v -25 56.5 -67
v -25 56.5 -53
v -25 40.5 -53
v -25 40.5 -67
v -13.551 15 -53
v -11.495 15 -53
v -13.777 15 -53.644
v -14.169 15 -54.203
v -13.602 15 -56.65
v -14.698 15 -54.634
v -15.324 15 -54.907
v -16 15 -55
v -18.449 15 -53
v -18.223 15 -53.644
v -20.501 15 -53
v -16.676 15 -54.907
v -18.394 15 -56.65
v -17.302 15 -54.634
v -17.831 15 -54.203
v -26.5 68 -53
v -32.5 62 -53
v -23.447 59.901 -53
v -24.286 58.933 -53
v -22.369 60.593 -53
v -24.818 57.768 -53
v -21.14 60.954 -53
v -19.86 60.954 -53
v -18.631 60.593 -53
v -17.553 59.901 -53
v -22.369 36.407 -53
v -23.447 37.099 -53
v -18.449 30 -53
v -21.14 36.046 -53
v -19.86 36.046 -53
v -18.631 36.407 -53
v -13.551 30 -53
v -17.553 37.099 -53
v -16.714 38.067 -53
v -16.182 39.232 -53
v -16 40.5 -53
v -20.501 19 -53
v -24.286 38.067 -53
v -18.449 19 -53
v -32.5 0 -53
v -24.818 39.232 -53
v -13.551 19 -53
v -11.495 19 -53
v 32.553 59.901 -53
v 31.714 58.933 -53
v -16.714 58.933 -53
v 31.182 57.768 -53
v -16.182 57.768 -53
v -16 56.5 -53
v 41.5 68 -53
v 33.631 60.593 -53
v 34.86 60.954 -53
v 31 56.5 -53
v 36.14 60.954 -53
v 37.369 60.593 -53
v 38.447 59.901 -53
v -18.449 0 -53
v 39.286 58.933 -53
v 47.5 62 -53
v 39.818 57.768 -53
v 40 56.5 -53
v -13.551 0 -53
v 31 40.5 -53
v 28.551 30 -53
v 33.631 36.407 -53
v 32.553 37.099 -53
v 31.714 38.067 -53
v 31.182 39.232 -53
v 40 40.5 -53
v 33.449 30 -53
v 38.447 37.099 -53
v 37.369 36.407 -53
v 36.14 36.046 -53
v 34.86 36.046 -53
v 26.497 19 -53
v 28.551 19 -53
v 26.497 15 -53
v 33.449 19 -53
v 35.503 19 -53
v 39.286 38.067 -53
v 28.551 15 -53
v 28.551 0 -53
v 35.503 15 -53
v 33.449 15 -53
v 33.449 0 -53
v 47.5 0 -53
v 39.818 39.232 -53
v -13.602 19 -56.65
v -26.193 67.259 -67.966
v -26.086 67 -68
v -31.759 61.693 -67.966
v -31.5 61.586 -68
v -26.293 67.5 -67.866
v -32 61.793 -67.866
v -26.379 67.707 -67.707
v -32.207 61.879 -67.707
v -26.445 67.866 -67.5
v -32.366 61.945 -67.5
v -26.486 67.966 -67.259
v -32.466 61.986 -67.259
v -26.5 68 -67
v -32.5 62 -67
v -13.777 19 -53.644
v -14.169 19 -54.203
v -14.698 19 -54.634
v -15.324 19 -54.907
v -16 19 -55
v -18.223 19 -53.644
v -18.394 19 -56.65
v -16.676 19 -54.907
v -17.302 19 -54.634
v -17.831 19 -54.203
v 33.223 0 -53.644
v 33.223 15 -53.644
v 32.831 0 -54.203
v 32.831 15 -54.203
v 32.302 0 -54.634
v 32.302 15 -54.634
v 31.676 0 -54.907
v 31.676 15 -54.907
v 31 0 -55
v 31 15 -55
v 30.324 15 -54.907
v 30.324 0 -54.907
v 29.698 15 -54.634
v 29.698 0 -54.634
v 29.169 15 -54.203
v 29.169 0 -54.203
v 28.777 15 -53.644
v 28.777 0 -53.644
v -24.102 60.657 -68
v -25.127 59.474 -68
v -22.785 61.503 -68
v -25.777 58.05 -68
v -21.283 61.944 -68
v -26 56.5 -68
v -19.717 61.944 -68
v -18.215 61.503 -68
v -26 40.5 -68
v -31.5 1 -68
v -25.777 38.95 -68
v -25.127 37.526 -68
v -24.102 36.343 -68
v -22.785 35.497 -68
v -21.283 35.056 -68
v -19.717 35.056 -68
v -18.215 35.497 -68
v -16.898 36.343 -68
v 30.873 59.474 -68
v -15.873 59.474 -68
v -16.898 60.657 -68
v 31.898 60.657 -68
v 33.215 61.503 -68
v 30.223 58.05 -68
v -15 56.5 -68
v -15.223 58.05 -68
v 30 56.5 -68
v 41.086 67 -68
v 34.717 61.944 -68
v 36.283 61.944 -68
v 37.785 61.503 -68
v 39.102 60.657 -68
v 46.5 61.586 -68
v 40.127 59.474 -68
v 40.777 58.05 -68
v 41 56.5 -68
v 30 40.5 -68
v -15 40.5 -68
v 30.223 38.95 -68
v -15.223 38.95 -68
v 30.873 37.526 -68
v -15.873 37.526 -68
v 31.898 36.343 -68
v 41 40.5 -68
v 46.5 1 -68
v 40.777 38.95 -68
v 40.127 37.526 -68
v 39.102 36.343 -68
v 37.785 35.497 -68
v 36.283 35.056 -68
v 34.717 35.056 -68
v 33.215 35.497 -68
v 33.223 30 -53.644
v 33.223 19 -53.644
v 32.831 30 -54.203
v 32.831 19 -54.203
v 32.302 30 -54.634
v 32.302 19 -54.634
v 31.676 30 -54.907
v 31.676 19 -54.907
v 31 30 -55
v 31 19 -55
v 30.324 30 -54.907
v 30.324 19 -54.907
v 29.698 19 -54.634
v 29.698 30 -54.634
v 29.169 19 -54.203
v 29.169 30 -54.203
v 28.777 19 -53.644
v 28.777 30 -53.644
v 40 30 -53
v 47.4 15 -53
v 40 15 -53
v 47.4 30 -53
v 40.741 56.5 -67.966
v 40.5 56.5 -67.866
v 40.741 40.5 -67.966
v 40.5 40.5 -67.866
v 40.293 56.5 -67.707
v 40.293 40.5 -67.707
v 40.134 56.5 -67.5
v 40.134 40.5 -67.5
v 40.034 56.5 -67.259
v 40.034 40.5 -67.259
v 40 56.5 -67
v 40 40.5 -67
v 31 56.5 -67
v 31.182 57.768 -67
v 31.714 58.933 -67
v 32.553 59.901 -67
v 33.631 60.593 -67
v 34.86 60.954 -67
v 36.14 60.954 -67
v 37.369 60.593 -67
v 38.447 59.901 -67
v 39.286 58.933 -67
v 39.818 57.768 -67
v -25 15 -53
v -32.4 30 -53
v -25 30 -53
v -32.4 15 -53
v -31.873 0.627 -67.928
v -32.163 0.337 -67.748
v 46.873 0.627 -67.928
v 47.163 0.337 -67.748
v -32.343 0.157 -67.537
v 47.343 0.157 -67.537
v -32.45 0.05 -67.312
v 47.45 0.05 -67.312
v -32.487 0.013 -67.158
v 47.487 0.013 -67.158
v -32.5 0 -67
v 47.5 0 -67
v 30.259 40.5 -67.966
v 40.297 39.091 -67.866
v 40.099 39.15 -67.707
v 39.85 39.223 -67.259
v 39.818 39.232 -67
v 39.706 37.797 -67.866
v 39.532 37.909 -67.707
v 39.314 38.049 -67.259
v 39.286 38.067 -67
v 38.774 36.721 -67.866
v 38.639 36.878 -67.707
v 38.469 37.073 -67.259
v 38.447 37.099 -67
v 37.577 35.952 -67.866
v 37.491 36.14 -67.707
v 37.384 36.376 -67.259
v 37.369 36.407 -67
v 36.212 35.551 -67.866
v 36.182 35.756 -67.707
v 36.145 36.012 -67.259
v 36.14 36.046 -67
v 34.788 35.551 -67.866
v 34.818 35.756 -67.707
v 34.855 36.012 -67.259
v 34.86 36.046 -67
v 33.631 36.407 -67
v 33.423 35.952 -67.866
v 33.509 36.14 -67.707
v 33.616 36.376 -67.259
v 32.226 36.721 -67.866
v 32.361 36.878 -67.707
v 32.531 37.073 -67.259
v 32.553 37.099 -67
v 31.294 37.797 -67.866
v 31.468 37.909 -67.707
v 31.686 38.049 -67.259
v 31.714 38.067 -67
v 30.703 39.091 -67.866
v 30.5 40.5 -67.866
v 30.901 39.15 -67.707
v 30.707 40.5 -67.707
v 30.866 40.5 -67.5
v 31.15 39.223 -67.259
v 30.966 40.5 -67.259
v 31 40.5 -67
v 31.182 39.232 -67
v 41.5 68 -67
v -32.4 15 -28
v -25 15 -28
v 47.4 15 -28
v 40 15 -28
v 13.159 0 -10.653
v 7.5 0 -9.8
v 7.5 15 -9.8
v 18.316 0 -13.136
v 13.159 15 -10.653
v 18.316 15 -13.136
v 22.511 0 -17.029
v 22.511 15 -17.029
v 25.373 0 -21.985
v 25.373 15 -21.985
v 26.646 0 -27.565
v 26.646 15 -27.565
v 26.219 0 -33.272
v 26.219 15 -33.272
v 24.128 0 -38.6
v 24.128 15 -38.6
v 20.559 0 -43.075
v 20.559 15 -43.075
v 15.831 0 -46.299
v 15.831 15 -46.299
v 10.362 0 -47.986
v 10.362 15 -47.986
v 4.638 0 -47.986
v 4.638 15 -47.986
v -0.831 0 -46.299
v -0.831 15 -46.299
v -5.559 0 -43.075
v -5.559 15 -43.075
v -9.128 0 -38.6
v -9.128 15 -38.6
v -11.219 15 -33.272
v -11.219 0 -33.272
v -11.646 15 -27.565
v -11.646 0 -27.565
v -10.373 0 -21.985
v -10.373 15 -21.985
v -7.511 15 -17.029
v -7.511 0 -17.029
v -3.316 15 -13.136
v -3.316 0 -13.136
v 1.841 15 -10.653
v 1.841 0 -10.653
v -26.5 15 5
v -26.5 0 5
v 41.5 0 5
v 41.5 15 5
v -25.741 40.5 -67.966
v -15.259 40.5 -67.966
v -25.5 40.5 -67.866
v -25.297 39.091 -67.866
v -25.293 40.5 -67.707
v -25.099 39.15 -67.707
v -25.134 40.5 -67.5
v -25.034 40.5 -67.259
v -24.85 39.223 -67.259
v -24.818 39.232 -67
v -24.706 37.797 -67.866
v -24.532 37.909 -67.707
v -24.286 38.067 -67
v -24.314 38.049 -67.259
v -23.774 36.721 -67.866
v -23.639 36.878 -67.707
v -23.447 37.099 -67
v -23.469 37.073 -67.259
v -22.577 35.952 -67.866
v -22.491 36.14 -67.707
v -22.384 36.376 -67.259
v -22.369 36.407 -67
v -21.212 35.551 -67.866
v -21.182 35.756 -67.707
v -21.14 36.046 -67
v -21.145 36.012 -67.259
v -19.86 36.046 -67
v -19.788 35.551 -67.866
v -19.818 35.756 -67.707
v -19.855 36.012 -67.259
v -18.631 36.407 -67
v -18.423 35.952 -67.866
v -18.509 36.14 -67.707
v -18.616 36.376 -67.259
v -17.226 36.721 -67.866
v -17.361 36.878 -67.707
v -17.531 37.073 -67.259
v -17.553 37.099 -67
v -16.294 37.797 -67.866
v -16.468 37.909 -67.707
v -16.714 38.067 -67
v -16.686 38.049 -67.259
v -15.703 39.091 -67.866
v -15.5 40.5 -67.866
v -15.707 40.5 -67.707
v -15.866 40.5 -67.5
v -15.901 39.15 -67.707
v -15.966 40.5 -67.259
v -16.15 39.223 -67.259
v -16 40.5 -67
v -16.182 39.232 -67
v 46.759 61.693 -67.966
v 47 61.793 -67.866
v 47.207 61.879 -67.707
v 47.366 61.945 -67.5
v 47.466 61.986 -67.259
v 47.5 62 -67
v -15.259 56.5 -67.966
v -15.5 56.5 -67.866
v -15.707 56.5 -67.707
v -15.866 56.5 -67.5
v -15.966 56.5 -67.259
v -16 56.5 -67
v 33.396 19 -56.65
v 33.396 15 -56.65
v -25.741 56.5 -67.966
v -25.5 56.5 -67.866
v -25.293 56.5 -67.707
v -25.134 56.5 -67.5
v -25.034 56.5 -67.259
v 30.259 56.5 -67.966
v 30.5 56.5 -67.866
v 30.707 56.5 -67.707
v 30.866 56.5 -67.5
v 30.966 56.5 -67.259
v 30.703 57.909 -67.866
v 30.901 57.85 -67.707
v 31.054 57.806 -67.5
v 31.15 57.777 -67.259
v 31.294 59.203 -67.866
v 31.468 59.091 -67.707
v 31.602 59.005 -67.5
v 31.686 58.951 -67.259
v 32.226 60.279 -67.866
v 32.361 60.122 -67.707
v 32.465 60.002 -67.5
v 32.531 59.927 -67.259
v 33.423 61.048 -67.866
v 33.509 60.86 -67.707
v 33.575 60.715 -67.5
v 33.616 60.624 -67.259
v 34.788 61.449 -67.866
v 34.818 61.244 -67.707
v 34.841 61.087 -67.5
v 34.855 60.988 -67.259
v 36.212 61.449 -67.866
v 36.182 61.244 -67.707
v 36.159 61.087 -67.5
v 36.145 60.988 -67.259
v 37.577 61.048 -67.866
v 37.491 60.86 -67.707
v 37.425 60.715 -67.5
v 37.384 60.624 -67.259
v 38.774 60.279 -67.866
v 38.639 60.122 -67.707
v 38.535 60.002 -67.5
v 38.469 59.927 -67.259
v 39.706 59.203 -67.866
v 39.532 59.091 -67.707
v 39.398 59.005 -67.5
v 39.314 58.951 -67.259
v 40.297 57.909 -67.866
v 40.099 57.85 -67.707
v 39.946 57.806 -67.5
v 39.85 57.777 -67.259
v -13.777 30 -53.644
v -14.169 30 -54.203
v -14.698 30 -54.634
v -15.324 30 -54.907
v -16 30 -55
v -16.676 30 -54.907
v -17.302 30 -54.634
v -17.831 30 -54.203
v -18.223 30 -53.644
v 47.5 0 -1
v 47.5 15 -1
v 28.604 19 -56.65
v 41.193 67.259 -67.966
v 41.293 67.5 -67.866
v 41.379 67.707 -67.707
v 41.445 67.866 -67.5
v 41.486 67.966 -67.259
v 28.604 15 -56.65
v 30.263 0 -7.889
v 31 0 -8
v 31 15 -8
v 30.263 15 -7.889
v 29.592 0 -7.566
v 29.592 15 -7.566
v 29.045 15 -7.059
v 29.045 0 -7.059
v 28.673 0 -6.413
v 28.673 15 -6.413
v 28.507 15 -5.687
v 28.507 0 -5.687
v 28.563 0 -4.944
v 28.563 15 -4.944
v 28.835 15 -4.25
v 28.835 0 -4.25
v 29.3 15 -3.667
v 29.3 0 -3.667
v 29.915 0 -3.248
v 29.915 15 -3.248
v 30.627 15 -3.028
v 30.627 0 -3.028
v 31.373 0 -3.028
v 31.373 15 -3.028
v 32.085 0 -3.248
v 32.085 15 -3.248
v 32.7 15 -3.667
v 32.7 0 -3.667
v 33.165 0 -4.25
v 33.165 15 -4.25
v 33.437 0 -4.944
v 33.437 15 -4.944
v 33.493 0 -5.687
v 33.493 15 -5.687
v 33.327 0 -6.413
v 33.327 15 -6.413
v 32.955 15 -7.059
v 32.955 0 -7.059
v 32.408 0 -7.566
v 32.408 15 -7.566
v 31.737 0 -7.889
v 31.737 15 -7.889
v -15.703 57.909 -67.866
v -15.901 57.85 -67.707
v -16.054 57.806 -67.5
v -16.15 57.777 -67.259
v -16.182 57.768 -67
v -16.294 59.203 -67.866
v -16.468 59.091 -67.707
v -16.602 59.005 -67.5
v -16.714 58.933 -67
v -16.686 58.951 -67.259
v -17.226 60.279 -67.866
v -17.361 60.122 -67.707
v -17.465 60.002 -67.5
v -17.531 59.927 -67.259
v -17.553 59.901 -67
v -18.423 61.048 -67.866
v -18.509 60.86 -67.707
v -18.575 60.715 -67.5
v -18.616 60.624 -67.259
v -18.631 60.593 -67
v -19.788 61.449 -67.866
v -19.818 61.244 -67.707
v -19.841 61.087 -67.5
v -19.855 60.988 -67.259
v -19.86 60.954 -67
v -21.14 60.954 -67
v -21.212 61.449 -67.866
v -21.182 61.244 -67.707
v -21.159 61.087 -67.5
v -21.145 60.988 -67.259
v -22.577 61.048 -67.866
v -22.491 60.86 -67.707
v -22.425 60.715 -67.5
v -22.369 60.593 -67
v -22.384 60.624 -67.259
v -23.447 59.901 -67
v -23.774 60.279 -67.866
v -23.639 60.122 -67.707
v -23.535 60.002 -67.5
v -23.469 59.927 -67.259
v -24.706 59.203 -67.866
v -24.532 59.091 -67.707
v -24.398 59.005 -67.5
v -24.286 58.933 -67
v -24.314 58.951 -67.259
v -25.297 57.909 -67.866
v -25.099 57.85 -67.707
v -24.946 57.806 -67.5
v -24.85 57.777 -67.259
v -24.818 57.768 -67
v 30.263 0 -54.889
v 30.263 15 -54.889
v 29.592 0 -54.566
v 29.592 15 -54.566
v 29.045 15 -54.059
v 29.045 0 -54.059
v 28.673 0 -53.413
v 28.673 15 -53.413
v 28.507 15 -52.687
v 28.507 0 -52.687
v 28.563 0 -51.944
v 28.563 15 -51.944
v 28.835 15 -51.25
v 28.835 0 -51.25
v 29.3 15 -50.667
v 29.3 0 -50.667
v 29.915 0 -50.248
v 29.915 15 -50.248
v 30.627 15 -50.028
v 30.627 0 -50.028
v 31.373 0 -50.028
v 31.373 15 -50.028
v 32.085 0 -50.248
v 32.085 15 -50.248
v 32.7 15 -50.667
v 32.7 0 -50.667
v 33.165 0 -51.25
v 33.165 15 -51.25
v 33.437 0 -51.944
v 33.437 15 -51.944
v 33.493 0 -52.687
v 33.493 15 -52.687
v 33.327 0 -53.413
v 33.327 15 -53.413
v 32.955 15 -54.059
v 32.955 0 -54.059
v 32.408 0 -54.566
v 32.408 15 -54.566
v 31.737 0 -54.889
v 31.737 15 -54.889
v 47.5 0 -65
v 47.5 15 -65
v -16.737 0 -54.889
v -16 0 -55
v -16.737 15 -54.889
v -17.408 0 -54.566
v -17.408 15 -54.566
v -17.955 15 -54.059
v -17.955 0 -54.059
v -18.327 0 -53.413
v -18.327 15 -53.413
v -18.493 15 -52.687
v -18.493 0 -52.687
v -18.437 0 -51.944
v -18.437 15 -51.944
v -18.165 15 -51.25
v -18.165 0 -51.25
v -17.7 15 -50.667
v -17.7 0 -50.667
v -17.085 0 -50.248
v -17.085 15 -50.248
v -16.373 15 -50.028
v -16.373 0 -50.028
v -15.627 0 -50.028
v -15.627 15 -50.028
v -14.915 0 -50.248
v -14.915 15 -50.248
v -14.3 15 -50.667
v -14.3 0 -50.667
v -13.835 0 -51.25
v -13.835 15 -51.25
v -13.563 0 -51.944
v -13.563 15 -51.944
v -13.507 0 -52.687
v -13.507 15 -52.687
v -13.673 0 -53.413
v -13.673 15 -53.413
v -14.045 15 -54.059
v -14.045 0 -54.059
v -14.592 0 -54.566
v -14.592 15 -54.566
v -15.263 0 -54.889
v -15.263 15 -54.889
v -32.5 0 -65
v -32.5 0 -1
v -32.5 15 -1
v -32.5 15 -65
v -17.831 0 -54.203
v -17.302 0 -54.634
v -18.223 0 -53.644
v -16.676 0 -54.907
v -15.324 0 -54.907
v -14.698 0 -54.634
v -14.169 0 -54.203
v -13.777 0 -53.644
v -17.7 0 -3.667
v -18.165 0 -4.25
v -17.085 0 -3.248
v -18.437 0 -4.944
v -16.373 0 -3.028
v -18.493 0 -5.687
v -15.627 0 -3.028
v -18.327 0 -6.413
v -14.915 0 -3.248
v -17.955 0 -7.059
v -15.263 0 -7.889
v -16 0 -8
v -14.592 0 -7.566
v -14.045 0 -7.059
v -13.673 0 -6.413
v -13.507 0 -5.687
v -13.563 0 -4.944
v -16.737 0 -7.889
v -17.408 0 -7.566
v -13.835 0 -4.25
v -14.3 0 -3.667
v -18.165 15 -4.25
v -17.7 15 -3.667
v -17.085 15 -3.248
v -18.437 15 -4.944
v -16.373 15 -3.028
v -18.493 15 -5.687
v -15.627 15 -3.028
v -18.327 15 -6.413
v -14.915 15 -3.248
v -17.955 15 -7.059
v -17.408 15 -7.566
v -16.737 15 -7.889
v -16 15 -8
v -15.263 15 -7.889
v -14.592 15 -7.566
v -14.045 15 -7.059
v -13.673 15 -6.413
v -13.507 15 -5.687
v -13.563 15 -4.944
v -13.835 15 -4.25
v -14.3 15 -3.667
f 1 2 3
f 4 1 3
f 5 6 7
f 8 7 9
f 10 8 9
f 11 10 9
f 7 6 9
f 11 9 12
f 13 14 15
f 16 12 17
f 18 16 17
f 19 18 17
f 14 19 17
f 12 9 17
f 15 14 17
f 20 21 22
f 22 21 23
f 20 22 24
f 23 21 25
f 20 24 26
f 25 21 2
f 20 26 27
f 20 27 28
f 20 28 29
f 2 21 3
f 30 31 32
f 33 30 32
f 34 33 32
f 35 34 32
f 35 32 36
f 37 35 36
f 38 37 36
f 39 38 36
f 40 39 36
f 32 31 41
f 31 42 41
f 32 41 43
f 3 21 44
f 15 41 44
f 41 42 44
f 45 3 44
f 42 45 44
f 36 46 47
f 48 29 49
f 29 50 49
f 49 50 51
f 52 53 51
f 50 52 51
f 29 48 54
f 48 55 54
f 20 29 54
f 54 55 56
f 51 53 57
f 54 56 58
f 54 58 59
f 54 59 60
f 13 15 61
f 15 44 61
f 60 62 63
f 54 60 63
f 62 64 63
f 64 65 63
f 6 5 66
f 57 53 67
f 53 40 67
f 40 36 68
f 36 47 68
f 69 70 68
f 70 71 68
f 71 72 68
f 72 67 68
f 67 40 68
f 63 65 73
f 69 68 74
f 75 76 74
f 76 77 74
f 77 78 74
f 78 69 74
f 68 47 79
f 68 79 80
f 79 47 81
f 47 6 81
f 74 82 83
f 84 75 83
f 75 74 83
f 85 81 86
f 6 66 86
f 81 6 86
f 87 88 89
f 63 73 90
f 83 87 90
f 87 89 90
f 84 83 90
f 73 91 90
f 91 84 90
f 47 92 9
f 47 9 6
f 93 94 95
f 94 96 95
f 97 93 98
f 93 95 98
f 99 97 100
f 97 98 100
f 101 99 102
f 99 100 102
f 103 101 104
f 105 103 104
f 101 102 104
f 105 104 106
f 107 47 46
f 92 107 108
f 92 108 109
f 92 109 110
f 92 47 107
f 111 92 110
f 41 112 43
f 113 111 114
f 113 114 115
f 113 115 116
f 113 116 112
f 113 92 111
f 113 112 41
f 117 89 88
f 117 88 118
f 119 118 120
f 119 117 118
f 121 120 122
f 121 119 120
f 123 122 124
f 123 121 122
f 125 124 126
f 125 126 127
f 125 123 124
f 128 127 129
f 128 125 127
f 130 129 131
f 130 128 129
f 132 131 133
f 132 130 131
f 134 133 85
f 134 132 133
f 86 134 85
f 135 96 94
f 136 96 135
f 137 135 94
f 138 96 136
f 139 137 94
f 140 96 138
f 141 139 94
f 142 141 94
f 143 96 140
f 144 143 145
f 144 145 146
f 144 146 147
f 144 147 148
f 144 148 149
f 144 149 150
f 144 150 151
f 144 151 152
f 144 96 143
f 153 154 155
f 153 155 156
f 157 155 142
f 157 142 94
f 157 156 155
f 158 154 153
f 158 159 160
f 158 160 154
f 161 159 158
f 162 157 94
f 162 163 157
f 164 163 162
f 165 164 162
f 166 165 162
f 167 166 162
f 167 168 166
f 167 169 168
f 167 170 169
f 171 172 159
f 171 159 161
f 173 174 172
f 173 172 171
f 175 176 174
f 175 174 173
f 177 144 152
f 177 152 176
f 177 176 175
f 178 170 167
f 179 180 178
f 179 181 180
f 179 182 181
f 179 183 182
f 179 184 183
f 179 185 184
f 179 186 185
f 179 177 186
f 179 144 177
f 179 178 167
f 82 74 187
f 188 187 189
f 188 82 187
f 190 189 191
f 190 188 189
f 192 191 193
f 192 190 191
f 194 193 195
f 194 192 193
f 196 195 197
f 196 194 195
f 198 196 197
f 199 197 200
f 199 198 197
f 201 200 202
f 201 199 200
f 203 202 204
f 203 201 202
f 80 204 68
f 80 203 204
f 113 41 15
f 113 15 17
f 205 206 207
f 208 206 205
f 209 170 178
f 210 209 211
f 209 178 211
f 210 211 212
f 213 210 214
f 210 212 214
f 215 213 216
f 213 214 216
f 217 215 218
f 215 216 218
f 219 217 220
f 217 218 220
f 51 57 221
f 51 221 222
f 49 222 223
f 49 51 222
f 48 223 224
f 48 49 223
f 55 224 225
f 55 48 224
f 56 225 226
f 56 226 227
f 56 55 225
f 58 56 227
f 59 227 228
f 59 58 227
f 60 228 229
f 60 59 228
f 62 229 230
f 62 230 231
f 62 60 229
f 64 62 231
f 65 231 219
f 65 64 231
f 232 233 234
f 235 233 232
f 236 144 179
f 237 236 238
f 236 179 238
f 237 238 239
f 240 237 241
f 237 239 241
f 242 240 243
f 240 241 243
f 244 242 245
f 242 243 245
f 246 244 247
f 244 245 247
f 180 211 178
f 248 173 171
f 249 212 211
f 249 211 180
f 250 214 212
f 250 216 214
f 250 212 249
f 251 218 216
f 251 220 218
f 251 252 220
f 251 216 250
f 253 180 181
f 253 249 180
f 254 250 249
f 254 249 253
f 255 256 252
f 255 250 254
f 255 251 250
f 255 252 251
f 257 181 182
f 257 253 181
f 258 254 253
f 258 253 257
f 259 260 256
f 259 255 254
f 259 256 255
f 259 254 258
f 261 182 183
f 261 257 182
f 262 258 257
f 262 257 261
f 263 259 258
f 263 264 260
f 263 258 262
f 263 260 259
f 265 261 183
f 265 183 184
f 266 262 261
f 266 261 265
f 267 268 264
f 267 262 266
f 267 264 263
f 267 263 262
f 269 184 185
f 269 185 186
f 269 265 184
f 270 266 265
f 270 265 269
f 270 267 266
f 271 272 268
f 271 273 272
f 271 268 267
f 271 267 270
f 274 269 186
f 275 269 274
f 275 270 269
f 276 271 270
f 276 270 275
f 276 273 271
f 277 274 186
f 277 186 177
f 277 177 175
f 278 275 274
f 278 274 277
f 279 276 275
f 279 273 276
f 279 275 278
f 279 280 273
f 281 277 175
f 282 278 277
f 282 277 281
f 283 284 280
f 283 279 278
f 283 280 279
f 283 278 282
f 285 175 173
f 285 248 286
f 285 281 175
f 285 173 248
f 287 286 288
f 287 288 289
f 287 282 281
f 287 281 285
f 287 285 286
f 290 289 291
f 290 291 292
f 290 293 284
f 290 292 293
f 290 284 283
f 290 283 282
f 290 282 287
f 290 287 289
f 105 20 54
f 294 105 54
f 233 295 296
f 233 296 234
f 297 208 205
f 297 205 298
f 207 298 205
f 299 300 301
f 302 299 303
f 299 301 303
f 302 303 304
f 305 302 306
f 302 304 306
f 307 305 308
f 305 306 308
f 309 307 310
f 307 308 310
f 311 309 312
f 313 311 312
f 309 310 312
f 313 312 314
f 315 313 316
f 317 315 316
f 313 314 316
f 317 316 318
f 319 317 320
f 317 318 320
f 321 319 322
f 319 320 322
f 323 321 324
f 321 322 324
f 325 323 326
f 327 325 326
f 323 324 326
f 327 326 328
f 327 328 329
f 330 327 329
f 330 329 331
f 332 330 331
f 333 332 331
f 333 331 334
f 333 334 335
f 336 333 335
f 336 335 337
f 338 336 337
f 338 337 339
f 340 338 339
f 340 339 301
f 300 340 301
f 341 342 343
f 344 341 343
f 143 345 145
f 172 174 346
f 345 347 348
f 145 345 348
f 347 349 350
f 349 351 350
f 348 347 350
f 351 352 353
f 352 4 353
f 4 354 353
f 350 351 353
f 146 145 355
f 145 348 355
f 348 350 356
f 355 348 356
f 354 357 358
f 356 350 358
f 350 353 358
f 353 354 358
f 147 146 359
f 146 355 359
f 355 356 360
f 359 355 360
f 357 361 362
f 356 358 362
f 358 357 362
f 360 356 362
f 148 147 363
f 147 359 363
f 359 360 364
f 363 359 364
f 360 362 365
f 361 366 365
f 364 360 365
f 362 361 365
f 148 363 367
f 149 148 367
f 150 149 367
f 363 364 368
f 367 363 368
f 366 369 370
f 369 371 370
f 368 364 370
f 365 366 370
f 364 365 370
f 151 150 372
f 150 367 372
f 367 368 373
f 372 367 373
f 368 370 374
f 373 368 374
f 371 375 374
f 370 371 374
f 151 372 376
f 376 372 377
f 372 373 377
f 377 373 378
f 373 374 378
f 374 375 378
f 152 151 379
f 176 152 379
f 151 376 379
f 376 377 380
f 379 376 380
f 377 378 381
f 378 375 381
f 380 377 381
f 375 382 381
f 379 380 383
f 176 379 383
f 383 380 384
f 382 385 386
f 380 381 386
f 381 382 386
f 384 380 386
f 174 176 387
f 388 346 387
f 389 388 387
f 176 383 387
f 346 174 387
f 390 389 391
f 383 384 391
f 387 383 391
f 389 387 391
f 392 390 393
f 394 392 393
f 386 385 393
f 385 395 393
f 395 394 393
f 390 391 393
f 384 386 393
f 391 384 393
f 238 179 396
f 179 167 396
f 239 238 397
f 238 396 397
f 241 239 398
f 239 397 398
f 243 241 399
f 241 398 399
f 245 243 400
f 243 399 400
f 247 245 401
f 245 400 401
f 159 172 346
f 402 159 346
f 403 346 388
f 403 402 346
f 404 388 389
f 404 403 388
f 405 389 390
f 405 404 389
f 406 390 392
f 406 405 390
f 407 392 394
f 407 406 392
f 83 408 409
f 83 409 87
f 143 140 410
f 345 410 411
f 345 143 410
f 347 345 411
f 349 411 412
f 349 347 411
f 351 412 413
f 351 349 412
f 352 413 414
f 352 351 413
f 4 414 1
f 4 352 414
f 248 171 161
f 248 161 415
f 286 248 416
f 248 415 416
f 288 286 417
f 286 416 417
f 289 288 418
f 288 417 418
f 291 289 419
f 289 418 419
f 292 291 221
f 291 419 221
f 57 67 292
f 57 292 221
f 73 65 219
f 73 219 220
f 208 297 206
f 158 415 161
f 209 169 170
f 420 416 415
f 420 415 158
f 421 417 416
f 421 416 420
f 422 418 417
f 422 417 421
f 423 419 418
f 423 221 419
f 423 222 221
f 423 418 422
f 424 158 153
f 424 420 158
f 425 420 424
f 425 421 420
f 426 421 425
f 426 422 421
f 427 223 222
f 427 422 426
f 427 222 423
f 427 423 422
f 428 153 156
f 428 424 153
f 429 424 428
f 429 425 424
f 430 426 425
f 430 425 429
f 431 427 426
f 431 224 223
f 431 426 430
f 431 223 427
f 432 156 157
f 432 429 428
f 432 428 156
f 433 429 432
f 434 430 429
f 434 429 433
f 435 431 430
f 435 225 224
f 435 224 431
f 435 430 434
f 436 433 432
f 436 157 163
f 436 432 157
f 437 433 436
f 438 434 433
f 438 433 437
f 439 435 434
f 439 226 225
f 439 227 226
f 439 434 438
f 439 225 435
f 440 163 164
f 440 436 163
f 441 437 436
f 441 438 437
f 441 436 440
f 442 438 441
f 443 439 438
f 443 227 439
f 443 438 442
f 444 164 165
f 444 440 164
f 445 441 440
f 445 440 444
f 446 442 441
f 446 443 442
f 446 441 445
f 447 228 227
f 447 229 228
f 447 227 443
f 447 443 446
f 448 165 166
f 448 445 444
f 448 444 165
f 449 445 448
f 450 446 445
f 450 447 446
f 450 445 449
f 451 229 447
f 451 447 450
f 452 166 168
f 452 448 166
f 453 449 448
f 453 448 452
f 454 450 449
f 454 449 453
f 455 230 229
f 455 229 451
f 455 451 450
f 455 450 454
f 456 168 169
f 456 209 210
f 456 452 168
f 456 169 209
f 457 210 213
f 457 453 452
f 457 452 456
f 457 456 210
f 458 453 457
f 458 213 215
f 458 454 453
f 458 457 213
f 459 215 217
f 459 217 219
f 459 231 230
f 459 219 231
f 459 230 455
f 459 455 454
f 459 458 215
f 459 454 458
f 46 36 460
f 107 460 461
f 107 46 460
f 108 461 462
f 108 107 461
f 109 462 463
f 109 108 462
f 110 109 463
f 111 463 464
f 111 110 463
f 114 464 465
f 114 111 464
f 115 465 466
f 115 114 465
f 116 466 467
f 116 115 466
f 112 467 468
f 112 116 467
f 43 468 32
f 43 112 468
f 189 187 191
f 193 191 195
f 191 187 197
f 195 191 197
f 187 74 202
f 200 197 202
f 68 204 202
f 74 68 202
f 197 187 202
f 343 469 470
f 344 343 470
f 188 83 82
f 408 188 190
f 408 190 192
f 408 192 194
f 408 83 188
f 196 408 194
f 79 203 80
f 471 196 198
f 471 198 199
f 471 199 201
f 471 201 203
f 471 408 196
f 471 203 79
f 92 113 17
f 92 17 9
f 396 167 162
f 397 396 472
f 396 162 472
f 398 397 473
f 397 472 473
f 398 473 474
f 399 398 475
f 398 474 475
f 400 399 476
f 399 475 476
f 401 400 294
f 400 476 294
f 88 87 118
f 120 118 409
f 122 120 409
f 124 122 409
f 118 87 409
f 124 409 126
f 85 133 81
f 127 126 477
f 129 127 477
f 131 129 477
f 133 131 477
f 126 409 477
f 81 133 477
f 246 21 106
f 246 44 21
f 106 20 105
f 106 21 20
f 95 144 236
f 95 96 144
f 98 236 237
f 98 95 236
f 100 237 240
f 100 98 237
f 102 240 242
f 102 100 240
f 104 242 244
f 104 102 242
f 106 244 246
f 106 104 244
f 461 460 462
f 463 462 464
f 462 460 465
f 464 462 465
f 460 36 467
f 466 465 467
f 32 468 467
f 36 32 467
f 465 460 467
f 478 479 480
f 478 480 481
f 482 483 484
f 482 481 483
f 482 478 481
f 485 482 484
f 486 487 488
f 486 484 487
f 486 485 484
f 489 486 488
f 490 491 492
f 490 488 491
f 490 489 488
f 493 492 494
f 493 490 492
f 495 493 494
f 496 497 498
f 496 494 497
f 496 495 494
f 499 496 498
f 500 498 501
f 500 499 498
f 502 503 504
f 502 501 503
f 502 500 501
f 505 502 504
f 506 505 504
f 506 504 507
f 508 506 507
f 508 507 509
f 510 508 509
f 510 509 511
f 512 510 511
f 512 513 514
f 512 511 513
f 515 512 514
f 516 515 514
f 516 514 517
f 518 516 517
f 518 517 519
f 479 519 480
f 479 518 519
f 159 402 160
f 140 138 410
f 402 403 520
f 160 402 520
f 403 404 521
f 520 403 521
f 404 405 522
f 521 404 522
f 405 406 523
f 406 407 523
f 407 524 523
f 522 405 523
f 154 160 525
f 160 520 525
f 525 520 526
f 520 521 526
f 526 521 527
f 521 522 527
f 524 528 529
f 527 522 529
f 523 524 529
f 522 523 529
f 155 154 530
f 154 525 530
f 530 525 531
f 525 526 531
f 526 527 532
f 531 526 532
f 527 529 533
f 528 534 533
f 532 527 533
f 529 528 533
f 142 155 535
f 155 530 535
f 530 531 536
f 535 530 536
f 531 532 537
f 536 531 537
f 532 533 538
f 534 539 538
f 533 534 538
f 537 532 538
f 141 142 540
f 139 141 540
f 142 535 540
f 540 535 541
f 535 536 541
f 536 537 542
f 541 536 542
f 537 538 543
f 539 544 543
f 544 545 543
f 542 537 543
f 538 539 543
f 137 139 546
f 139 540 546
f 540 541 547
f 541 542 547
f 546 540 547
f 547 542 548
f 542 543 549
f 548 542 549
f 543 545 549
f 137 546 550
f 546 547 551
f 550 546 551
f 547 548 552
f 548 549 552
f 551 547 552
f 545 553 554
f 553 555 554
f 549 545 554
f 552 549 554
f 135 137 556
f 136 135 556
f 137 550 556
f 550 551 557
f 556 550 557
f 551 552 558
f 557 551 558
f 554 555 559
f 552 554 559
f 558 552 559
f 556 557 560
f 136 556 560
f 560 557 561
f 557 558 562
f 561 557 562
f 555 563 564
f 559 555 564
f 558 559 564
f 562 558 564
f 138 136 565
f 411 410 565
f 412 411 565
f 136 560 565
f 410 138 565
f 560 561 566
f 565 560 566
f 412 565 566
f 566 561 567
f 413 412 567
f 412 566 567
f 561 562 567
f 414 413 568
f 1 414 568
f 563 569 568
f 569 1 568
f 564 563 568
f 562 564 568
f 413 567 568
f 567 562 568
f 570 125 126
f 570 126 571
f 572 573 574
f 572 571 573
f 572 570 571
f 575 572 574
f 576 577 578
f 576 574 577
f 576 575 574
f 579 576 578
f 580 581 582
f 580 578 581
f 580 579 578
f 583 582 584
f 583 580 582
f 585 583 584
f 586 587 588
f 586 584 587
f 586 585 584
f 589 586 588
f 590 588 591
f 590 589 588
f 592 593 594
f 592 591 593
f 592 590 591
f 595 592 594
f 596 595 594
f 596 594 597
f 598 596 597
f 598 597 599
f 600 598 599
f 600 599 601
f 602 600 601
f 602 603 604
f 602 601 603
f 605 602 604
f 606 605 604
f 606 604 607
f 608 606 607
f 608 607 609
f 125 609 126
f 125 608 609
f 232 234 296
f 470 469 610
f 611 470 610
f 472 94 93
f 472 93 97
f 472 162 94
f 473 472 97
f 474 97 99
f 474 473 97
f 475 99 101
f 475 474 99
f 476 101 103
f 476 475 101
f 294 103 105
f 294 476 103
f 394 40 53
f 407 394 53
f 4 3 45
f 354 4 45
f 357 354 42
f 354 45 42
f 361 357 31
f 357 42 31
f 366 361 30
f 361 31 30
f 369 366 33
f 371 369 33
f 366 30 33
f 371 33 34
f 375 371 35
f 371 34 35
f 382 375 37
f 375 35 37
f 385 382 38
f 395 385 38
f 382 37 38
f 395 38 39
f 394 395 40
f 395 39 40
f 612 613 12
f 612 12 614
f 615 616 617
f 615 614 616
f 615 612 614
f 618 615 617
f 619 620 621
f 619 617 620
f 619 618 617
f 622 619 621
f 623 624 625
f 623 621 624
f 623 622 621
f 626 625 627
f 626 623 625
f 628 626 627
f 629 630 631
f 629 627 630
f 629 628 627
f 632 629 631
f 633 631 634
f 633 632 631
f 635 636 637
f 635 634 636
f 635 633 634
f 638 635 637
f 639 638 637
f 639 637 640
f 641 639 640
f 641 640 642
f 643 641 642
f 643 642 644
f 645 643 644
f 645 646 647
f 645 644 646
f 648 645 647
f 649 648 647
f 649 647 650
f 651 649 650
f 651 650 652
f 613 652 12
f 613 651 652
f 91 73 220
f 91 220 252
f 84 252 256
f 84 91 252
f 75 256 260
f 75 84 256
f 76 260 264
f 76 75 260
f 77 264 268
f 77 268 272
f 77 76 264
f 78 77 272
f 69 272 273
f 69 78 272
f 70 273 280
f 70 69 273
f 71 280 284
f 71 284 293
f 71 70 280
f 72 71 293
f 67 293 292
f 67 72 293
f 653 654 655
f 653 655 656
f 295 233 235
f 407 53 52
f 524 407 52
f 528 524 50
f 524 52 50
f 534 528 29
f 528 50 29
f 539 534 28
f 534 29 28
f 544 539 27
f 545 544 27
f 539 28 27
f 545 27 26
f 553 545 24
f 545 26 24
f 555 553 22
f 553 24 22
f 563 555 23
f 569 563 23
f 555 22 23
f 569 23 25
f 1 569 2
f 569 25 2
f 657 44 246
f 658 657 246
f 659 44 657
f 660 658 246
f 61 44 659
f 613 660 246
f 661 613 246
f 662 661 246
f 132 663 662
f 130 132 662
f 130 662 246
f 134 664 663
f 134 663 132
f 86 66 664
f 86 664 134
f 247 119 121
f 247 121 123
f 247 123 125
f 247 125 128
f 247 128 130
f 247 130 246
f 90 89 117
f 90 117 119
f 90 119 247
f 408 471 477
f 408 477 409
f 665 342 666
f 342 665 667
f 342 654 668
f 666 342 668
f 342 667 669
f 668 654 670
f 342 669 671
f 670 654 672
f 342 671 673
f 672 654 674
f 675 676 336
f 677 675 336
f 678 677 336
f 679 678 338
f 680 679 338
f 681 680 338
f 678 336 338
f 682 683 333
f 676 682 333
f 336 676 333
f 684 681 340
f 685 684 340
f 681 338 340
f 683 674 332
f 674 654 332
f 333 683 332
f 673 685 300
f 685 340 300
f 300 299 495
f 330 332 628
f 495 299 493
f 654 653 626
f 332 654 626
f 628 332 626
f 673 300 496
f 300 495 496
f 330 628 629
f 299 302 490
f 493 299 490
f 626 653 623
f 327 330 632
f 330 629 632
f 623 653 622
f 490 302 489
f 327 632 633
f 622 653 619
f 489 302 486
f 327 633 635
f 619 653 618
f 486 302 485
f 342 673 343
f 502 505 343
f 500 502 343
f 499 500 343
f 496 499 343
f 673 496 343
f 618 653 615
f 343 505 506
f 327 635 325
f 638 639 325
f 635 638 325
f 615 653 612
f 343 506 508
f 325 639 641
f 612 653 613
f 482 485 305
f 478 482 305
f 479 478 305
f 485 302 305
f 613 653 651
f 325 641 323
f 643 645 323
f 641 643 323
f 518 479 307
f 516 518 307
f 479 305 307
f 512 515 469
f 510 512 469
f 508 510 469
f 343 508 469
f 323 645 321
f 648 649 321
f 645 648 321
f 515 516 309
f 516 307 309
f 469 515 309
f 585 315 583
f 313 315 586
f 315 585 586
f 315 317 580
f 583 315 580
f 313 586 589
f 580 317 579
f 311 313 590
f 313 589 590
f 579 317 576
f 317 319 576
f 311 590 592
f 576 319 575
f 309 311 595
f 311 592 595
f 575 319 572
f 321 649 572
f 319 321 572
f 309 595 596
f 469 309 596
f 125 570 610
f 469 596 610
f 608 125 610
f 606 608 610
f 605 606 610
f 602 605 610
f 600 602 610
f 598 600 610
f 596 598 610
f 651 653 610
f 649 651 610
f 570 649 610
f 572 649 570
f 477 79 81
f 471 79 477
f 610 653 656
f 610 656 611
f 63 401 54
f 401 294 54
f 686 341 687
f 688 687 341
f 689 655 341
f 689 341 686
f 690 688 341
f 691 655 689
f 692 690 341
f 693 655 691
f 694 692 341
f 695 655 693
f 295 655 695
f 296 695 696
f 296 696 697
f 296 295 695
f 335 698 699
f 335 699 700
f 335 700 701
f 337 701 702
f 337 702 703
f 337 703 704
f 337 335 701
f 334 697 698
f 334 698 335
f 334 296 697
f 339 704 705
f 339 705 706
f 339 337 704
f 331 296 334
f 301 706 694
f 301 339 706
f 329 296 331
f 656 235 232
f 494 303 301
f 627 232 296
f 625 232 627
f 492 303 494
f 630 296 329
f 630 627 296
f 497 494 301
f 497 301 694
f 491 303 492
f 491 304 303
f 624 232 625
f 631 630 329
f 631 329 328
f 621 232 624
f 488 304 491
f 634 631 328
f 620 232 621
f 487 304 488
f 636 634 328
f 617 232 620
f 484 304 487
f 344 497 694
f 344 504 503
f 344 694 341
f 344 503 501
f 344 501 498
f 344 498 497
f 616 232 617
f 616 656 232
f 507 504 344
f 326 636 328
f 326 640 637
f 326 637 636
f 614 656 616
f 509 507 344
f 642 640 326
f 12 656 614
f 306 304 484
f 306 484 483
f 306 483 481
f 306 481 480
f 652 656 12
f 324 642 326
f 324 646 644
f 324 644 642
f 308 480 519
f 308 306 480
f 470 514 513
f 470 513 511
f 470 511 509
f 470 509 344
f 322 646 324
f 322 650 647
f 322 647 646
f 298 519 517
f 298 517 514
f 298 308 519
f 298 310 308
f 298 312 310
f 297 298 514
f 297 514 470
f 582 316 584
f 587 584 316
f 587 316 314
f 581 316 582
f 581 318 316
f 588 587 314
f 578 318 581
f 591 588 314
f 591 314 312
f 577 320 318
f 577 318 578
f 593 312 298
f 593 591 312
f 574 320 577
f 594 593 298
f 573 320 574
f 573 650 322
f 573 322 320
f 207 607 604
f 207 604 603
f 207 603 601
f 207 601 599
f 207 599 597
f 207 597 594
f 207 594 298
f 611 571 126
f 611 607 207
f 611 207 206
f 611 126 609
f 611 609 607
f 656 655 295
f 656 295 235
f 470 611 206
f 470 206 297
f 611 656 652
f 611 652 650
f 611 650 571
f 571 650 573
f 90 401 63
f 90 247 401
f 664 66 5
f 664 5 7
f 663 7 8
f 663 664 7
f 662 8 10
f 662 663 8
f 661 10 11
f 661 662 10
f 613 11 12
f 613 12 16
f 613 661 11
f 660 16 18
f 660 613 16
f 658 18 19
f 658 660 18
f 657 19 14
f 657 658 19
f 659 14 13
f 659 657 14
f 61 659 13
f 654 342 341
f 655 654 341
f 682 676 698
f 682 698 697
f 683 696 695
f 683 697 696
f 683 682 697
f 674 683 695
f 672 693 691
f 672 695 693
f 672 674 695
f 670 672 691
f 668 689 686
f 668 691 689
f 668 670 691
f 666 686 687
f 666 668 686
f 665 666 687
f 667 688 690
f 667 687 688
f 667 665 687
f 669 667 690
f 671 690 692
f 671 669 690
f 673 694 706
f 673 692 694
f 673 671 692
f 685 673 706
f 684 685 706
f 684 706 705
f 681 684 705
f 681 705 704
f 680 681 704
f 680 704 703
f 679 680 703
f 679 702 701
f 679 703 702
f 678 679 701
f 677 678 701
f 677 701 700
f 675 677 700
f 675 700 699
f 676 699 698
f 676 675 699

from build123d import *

# Parameters (mm, degrees)
SKETCH1_W               = 80
SKETCH1_H               = 70
BOSS_EXTRUDE1_DEPTH     = 15
SKETCH2_W               = 80
SKETCH2_H               = 3
SKETCH2_H_2             = 12
BOSS_EXTRUDE2_DEPTH     = 68
SKETCH4_R               = 19.2
CUT_EXTRUDE1_DEPTH      = 99.433988033
CUT_EXTRUDE2_DEPTH      = 15
CUT_EXTRUDE2_DEPTH_BACK = 99.433988033
SKETCH5_R               = 2.5
CUT_EXTRUDE3_DEPTH      = 15
BOSS_EXTRUDE3_START     = -0.1
BOSS_EXTRUDE3_DEPTH     = 7.4
BOSS_EXTRUDE4_START     = -0.1
BOSS_EXTRUDE4_DEPTH     = 7.4
CHAMFER1_SIZE           = 6
CUT_EXTRUDE7_START      = 4
SKETCH5_5_R             = 2.5
CUT_EXTRUDE7_DEPTH      = 4
CHAMFER2_SIZE           = 6
FILLET3_R               = 1


with BuildPart() as part:
    # Sketch1 → Boss-Extrude1 (new body)
    with BuildSketch(Plane(origin=(0, 0, 0), x_dir=(1, 0, 0), z_dir=(0, 1, 0))):
        with Locations((7.5, 30)):
            Rectangle(SKETCH1_W, SKETCH1_H)
    extrude(amount=BOSS_EXTRUDE1_DEPTH)

    # Sketch4 → Cut-Extrude1 (cut, through all)
    with BuildSketch(Plane(origin=(0, 15, 0), x_dir=(1, 0, 0), z_dir=(0, 1, 0))):
        with Locations(Location((7.5, 29, 0), (0, 0, 270))):
            Circle(SKETCH4_R)
    extrude(amount=-CUT_EXTRUDE1_DEPTH, mode=Mode.SUBTRACT)


with BuildPart() as body_2:
    # Sketch2 → Boss-Extrude2 (new body)
    with BuildSketch(Plane.XZ):
        with Locations((7.5, -66.5)):
            Rectangle(SKETCH2_W, SKETCH2_H)
        with Locations((7.5, -59)):
            Rectangle(SKETCH2_W, SKETCH2_H_2)
    extrude(amount=-BOSS_EXTRUDE2_DEPTH)


with BuildPart() as cut_extrude2_tool:
    # Sketch5 → Cut-Extrude2 (new, two sides: drawn at the far end of the back side and taken through both)
    with BuildSketch(Plane(origin=(0, 15, 0), x_dir=(1, 0, 0), z_dir=(0, 1, 0)).offset(-CUT_EXTRUDE2_DEPTH_BACK)):
        with Locations(Location((-16, 52.5, 0), (0, 0, 90))):
            Circle(SKETCH5_R)
        with Locations(Location((31, 52.5, 0), (0, 0, 90))):
            Circle(SKETCH5_R)
        with Locations(Location((31, 5.5, 0), (0, 0, 90))):
            Circle(SKETCH5_R)
        with Locations(Location((-16, 5.5, 0), (0, 0, 90))):
            Circle(SKETCH5_R)
    extrude(amount=CUT_EXTRUDE2_DEPTH + CUT_EXTRUDE2_DEPTH_BACK)


with BuildPart() as part_1:
    add(part.part)

    # Cut-Extrude2: cut by cut_extrude2_tool
    add(cut_extrude2_tool.part, mode=Mode.SUBTRACT)

    # Sketch8 → Boss-Extrude3 (add)
    with BuildSketch(Plane.ZY.offset(32.5).offset(BOSS_EXTRUDE3_START)):
        Polygon((-28, 15), (-53, 30), (-53, 15), align=None)
    extrude(amount=-BOSS_EXTRUDE3_DEPTH)

    # Sketch9 → Boss-Extrude4 (add)
    with BuildSketch(Plane(origin=(47.5, 0, 0), x_dir=(0, 0, -1), z_dir=(1, 0, 0)).offset(BOSS_EXTRUDE4_START)):
        Polygon((53, 15), (53, 30), (28, 15), align=None)
    extrude(amount=-BOSS_EXTRUDE4_DEPTH)

    # Chamfer1
    chamfer1_edges = [part_1.edges().sort_by_distance(p)[0] for p in [
        (47.5, 7.5, 5),
        (-32.5, 7.5, 5),
    ]]
    chamfer(chamfer1_edges, length=CHAMFER1_SIZE)


with BuildPart() as body_2_1:
    add(body_2.part)

    # Cut-Extrude2: cut by cut_extrude2_tool
    add(cut_extrude2_tool.part, mode=Mode.SUBTRACT)

    # Sketch6 → Cut-Extrude3 (cut)
    with BuildSketch(Plane.XY.offset(-53)):
        with BuildLine():
            Line((-25, 56.5), (-25, 40.5))
            ThreePointArc((-25, 40.5), (-20.5, 36), (-16, 40.5))
            Line((-16, 40.5), (-16, 56.5))
            ThreePointArc((-16, 56.5), (-20.5, 61), (-25, 56.5))
        make_face()
        with BuildLine():
            ThreePointArc((40, 40.5), (35.5, 36), (31, 40.5))
            Line((31, 40.5), (31, 56.5))
            ThreePointArc((31, 56.5), (35.5, 61), (40, 56.5))
            Line((40, 56.5), (40, 40.5))
        make_face()
    extrude(amount=-CUT_EXTRUDE3_DEPTH, mode=Mode.SUBTRACT)

    # Sketch5<5> → Cut-Extrude7 (cut)
    # profile 1 of 4: a face of its own
    with BuildSketch(Plane(origin=(0, 15, 0), x_dir=(1, 0, 0), z_dir=(0, 1, 0)).offset(CUT_EXTRUDE7_START)):
        Polygon((-18.393996383, 56.65), (-13.601989149, 56.65), (-11.205985531, 52.5), (-13.601989149, 48.35), (-18.393996383, 48.35), (-20.79, 52.5), align=None)
        with Locations(Location((-16, 52.5, 0), (0, 0, 90))):
            Circle(SKETCH5_5_R, mode=Mode.SUBTRACT)
    # profile 2 of 4: a face of its own
    with BuildSketch(Plane(origin=(0, 15, 0), x_dir=(1, 0, 0), z_dir=(0, 1, 0)).offset(CUT_EXTRUDE7_START)):
        Polygon((35.792007234, 52.5), (33.396003617, 48.35), (28.603996383, 48.35), (26.207992766, 52.5), (28.603996383, 56.65), (33.396003617, 56.65), align=None)
        with Locations(Location((31, 52.5, 0), (0, 0, 90))):
            Circle(SKETCH5_5_R, mode=Mode.SUBTRACT)
    # profile 3 of 4: a face of its own
    with BuildSketch(Plane(origin=(0, 15, 0), x_dir=(1, 0, 0), z_dir=(0, 1, 0)).offset(CUT_EXTRUDE7_START)):
        with Locations(Location((31, 52.5, 0), (0, 0, 90))):
            Circle(SKETCH5_5_R)
    # profile 4 of 4: a face of its own
    with BuildSketch(Plane(origin=(0, 15, 0), x_dir=(1, 0, 0), z_dir=(0, 1, 0)).offset(CUT_EXTRUDE7_START)):
        with Locations(Location((-16, 52.5, 0), (0, 0, 90))):
            Circle(SKETCH5_5_R)
    extrude(amount=-CUT_EXTRUDE7_DEPTH, mode=Mode.SUBTRACT)

    # Chamfer2
    chamfer2_edges = [body_2_1.edges().sort_by_distance(p)[0] for p in [
        (-32.5, 68, -60.5),
        (47.5, 68, -60.5),
    ]]
    chamfer(chamfer2_edges, length=CHAMFER2_SIZE)

    # Fillet3
    fillet3_edges = [body_2_1.edges().sort_by_distance(p)[0] for p in [
        (-32.5, 31, -68),
        (7.5, 68, -68),
        (47.5, 31, -68),
        (44.5, 65, -68),
        (-29.5, 65, -68),
        (-16, 48.5, -68),
        (-20.5, 36, -68),
        (-20.5, 61, -68),
        (-25, 48.5, -68),
        (7.5, 0, -68),
        (31, 48.5, -68),
        (40, 48.5, -68),
        (35.5, 36, -68),
        (35.5, 61, -68),
    ]]
    fillet(fillet3_edges, radius=FILLET3_R)


solid = Compound([part_1.part, body_2_1.part])
